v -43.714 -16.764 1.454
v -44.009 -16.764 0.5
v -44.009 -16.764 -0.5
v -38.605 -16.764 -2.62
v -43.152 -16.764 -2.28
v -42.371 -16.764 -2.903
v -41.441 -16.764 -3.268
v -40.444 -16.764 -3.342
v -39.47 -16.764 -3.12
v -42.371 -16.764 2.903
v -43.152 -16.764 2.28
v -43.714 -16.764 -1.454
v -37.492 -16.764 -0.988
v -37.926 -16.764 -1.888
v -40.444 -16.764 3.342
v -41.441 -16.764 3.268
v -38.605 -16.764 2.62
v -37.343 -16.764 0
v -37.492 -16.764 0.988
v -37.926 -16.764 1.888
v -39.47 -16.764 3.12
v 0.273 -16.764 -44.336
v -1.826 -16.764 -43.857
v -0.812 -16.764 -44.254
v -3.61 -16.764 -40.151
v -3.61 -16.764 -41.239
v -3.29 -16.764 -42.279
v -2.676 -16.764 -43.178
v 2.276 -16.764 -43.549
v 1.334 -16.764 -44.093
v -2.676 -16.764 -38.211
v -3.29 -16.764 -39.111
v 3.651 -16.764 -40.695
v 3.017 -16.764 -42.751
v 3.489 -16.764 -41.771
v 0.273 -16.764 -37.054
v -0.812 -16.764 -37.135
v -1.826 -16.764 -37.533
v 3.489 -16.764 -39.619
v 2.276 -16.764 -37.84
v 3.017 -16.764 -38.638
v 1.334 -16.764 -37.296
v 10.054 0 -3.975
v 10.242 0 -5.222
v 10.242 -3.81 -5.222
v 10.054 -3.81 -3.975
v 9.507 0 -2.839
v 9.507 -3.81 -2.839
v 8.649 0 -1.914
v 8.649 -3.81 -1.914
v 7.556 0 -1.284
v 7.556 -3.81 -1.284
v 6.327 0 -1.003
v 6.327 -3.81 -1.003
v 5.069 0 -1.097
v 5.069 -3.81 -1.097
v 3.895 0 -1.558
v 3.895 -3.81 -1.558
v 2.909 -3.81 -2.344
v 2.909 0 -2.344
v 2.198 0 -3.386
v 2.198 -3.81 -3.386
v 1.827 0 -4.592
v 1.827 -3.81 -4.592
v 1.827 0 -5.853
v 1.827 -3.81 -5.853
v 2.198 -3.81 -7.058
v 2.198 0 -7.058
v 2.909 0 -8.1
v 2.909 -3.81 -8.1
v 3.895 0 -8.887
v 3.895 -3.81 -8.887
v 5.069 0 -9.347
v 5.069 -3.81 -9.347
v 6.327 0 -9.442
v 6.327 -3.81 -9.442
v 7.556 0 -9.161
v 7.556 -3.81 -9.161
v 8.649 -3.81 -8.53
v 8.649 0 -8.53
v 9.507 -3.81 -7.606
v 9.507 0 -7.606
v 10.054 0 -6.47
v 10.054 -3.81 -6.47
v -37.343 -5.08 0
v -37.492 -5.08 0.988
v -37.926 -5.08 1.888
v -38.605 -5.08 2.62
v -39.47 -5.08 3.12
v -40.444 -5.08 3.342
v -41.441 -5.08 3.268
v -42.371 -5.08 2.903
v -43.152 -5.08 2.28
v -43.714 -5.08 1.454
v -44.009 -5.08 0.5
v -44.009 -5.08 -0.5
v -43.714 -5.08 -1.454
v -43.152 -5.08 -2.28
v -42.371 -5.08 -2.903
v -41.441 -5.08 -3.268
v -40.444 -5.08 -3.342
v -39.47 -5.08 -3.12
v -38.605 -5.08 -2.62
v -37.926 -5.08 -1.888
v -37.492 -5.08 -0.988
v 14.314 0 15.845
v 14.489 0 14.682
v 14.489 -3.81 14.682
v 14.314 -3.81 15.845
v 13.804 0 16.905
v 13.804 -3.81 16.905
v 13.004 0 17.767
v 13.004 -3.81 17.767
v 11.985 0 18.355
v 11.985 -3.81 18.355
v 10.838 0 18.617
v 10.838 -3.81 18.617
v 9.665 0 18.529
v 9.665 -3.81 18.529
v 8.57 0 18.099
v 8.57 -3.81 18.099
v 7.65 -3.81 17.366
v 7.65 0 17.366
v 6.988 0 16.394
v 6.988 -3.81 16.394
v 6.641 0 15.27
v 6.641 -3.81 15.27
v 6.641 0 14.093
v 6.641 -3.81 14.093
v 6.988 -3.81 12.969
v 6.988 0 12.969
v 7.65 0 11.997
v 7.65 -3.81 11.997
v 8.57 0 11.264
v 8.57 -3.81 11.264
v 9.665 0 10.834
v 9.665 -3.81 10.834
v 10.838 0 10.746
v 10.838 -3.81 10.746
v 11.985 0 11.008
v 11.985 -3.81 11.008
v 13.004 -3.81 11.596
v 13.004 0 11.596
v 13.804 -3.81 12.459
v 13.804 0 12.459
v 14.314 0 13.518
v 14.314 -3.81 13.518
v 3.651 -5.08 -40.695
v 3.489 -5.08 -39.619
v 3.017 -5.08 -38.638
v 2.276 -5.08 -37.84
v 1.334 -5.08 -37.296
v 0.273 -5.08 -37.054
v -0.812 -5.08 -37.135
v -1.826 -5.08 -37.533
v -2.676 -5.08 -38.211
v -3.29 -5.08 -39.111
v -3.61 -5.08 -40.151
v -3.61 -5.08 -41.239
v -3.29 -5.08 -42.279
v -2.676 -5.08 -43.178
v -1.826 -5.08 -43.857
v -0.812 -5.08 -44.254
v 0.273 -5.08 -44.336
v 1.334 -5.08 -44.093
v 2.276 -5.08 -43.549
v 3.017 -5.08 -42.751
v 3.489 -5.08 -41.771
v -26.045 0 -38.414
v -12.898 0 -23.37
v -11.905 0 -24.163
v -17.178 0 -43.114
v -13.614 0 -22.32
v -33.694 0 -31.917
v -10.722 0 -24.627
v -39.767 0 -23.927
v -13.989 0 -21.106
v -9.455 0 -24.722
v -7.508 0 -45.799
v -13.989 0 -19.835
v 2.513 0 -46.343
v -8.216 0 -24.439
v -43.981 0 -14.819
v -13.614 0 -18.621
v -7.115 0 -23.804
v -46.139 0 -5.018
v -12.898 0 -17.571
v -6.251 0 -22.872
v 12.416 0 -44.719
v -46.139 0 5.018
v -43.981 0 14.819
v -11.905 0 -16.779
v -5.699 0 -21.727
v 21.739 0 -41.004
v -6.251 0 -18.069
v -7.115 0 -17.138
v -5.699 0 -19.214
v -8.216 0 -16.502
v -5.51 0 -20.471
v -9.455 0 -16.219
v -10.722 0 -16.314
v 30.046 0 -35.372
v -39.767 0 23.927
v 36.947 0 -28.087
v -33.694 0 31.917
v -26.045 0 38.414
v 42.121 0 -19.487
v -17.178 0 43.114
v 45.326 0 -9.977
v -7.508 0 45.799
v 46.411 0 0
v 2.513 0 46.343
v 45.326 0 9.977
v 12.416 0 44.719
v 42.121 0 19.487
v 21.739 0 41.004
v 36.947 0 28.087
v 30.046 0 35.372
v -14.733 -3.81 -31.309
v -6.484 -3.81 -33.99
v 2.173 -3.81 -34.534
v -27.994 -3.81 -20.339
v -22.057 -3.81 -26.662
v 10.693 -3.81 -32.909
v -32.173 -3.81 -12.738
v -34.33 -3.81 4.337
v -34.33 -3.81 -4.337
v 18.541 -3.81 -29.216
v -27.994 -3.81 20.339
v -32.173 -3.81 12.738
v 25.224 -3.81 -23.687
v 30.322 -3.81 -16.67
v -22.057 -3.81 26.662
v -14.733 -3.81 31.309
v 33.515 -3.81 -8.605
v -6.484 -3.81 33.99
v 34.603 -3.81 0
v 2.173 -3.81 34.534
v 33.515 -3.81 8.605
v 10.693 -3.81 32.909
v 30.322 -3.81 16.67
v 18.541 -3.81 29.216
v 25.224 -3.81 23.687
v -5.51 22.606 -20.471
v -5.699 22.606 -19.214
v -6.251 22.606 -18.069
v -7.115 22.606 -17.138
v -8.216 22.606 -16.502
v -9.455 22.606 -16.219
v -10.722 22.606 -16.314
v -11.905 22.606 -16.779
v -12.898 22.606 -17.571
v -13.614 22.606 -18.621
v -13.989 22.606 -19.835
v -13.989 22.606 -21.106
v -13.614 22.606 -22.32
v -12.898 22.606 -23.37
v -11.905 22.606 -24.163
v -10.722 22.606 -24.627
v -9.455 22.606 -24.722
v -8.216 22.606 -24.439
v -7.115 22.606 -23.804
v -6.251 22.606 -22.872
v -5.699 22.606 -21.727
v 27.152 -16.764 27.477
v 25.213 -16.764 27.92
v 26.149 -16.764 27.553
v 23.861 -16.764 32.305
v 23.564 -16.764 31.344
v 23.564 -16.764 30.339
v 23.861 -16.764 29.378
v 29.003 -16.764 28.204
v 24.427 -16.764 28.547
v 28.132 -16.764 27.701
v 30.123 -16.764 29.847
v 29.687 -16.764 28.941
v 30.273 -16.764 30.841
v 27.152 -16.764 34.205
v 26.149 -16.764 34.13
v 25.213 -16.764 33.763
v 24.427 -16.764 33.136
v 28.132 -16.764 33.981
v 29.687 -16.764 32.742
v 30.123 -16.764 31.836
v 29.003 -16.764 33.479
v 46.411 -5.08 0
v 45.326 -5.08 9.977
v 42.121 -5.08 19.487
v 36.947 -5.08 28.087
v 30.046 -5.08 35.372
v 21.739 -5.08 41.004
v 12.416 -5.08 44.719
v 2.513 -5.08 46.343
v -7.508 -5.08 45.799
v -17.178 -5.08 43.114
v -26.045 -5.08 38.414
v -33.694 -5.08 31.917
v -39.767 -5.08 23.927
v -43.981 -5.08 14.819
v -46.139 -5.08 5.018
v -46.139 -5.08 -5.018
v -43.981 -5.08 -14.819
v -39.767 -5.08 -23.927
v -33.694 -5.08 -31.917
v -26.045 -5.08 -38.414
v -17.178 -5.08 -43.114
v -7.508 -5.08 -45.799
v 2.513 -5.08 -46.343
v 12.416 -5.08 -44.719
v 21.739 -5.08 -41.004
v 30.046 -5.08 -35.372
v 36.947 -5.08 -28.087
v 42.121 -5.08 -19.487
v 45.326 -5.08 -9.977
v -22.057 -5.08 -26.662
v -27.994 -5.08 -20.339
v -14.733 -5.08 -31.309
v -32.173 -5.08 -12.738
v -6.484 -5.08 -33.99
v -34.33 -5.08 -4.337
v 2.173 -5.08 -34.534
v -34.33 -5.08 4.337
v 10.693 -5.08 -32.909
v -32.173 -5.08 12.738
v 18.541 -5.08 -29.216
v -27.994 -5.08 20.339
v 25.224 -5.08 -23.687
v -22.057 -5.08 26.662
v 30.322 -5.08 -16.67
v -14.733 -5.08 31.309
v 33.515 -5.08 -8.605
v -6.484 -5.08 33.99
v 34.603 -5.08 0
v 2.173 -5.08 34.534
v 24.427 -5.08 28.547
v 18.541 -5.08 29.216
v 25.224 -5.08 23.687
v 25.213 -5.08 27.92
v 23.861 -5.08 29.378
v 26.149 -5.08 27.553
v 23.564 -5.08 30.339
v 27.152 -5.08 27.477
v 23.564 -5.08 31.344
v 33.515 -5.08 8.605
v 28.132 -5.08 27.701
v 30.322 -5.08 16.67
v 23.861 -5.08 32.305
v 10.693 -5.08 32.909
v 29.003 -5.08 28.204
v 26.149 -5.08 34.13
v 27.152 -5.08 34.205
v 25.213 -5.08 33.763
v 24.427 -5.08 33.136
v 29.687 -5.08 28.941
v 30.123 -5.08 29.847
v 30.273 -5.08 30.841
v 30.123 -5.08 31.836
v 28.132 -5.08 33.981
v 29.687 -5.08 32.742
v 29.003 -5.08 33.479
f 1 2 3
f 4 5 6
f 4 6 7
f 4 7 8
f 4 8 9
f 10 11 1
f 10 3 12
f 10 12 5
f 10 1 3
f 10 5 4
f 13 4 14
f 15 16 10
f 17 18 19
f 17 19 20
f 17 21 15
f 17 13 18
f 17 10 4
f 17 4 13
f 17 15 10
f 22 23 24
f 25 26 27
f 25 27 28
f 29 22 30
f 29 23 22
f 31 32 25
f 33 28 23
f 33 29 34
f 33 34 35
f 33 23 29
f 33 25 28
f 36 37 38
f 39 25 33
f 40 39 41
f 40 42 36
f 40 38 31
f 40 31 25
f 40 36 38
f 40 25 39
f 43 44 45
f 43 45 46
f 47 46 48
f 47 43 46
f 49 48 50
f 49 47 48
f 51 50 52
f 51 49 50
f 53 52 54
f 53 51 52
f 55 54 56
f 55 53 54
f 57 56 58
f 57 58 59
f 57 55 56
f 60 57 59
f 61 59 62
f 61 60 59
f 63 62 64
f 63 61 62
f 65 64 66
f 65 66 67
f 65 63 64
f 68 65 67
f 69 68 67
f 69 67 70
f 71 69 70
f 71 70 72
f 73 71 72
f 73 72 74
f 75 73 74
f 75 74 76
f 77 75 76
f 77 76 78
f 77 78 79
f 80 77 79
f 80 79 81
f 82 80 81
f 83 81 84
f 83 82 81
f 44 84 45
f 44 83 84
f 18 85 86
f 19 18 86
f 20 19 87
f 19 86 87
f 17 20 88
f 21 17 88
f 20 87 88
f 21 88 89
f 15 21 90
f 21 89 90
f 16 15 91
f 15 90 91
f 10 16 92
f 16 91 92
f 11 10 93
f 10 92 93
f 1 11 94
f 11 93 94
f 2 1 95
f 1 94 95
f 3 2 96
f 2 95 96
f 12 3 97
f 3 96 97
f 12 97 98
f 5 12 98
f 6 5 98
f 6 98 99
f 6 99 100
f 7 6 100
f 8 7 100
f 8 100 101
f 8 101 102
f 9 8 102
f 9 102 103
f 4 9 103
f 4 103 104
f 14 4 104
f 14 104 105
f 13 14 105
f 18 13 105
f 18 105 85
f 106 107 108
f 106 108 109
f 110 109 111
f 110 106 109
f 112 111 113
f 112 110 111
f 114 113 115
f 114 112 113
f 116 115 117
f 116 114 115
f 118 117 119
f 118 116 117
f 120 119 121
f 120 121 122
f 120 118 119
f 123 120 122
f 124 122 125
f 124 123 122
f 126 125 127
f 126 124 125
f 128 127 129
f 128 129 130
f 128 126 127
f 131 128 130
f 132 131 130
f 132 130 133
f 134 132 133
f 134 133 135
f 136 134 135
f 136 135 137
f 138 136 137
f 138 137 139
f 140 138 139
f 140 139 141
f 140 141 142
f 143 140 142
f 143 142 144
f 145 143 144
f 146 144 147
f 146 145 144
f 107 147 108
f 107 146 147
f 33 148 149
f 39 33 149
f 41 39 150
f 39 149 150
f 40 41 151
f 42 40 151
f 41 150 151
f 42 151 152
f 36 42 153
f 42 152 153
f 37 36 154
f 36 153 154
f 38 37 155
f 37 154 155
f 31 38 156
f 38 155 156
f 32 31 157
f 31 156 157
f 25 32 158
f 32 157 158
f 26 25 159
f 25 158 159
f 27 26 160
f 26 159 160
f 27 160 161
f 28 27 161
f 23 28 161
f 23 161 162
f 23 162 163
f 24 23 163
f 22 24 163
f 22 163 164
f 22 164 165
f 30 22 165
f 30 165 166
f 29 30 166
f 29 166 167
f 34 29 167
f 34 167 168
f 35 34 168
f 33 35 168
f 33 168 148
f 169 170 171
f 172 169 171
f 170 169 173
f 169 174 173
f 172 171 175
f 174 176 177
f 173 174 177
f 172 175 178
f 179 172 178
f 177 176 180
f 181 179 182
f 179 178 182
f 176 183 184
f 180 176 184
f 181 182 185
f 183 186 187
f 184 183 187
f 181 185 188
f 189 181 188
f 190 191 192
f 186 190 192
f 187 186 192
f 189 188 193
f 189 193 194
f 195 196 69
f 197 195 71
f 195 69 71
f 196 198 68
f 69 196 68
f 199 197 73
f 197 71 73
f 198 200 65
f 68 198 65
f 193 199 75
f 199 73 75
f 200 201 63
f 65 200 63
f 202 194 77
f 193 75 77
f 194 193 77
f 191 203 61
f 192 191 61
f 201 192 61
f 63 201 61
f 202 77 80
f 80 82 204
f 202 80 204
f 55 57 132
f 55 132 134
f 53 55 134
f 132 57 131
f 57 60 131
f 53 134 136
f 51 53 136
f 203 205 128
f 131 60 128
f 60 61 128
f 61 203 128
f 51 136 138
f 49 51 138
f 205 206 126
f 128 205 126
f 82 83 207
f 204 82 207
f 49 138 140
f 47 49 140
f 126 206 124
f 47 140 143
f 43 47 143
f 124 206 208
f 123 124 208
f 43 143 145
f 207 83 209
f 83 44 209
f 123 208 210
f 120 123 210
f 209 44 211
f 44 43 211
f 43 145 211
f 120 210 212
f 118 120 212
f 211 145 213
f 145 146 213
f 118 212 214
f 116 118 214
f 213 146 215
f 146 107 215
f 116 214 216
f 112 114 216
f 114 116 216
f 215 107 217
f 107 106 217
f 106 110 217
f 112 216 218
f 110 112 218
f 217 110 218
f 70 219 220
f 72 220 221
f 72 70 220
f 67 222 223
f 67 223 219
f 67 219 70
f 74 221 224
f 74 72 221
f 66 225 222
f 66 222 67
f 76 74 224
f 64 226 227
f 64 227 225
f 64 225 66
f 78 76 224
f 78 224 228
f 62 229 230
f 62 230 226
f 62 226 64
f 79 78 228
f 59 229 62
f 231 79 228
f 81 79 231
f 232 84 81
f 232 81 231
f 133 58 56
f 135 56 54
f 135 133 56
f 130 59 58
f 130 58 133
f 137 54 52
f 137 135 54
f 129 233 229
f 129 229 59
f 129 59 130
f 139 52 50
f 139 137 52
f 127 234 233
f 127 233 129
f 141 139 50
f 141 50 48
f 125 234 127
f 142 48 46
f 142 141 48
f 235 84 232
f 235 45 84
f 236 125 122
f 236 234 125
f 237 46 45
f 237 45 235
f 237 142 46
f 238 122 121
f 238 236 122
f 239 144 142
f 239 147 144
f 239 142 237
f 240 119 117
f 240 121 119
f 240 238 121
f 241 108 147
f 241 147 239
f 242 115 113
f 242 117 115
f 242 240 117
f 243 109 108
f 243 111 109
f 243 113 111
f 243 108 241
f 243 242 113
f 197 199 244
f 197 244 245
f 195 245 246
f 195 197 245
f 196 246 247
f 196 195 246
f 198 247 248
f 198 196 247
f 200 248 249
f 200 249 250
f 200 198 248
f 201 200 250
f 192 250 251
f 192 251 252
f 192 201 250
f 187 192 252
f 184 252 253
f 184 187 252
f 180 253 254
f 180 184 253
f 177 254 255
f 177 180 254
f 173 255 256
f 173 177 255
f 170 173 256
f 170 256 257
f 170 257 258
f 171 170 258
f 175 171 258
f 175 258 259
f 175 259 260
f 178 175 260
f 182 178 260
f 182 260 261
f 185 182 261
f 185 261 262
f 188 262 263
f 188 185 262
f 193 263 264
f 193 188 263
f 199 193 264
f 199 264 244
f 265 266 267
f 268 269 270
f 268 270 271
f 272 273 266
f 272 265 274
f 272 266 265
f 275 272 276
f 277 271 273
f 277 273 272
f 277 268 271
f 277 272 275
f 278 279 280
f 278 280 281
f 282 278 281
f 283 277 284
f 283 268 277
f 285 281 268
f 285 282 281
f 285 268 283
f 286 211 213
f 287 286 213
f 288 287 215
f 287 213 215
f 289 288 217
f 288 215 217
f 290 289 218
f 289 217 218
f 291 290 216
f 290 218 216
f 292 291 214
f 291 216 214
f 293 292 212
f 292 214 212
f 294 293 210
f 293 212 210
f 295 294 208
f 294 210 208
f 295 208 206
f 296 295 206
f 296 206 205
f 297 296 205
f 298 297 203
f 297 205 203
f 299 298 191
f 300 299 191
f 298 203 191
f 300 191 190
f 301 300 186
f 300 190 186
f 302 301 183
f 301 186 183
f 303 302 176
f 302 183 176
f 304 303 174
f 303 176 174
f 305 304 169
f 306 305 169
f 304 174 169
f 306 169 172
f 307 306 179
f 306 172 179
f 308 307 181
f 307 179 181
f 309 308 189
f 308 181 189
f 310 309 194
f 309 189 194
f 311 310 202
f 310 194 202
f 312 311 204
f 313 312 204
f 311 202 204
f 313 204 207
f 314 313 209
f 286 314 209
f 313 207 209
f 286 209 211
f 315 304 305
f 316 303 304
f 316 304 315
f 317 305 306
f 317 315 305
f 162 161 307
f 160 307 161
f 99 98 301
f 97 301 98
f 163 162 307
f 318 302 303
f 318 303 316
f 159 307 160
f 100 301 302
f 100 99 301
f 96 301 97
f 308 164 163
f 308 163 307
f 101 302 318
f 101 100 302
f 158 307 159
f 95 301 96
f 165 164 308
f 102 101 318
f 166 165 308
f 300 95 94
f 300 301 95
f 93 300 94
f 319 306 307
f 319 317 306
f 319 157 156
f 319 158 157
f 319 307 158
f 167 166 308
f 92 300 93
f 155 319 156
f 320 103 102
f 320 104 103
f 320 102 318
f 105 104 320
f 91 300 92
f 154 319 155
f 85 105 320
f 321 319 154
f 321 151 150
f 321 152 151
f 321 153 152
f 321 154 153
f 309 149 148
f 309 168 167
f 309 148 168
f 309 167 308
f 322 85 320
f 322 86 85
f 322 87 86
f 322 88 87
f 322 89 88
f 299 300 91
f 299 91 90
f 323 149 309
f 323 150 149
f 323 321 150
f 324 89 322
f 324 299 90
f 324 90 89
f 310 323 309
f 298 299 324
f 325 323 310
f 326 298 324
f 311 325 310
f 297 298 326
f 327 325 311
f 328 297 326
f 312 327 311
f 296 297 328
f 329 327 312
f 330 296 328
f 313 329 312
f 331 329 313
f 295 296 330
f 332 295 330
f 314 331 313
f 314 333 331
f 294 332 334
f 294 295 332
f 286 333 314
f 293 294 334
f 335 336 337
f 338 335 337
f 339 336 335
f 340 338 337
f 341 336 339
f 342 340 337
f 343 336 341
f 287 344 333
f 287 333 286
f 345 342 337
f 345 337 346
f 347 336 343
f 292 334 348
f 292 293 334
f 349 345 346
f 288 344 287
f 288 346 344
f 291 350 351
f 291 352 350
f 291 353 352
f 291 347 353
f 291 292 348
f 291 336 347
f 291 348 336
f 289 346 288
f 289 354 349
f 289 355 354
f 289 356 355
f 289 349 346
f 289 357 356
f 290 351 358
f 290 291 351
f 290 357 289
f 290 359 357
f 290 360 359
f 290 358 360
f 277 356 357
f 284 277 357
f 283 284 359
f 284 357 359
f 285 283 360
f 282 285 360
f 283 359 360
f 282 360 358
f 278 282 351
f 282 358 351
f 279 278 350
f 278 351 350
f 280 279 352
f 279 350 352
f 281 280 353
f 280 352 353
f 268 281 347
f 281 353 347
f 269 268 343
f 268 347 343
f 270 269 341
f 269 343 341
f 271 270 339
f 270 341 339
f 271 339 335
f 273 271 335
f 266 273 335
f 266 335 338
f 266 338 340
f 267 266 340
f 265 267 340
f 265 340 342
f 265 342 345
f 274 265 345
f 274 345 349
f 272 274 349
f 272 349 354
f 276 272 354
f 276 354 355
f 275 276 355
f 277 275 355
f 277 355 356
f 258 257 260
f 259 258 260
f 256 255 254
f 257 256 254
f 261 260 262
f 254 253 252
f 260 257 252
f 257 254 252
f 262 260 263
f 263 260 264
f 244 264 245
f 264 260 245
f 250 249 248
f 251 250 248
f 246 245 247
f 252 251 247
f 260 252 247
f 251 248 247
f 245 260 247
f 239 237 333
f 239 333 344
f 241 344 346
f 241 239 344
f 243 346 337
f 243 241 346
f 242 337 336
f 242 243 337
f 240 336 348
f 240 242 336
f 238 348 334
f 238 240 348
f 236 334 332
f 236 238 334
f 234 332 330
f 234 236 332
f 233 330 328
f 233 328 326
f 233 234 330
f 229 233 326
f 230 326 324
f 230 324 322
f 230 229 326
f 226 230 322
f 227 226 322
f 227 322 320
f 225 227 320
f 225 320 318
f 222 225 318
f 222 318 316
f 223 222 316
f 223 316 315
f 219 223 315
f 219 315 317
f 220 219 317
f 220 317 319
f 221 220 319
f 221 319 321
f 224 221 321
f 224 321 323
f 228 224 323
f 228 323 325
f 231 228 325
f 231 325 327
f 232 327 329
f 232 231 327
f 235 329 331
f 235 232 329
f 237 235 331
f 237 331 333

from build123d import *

# Parameters (mm, degrees)
F0_R     = 46.410682
F0_R_2   = 3.651099
F0_R_3   = 3.351621
F0_R_4   = 34.602582
F0_R_5   = 3.373279
F1_DEPTH = 5.08
F0_R_6   = 4.231249
F0_R_7   = 3.946303
F2_DEPTH = 3.81
F3_DEPTH = 16.764
F4_DEPTH = 16.764
F5_R     = 4.263251
F6_DEPTH = 22.606


with BuildPart() as f1:
    # F0 (on Front) → F1 (new body)
    with BuildSketch(Plane.XZ):
        Circle(F0_R)
        with Locations((0, -40.69474)):
            Circle(F0_R_2, mode=Mode.SUBTRACT)
        with Locations((-40.69474, 0)):
            Circle(F0_R_3, mode=Mode.SUBTRACT)
        Circle(F0_R_4, mode=Mode.SUBTRACT)
        with Locations((26.899913, 30.841293)):
            Circle(F0_R_5, mode=Mode.SUBTRACT)
    extrude(amount=F1_DEPTH)

    # F0 (on Front) → F2 (join)
    with BuildSketch(Plane.XZ):
        Circle(F0_R_4)
        with Locations((6.010604, -5.222328)):
            Circle(F0_R_6, mode=Mode.SUBTRACT)
        with Locations((10.543191, 14.681638)):
            Circle(F0_R_7, mode=Mode.SUBTRACT)
    extrude(amount=F2_DEPTH)

    # F0 (on Front) → F3 (join)
    with BuildSketch(Plane.XZ):
        with Locations((-40.69474, 0)):
            Circle(F0_R_3)
    extrude(amount=F3_DEPTH)

    # F0 (on Front) → F4 (join)
    with BuildSketch(Plane.XZ):
        with Locations((0, -40.69474)):
            Circle(F0_R_2)
        with Locations((26.899913, 30.841293)):
            Circle(F0_R_5)
    extrude(amount=F4_DEPTH)

    # F5 (on Front) → F6 (join)
    with BuildSketch(Plane.XZ):
        with Locations((-9.77318, -20.470712)):
            Circle(F5_R)
    extrude(amount=-F6_DEPTH)


solid = f1.part
